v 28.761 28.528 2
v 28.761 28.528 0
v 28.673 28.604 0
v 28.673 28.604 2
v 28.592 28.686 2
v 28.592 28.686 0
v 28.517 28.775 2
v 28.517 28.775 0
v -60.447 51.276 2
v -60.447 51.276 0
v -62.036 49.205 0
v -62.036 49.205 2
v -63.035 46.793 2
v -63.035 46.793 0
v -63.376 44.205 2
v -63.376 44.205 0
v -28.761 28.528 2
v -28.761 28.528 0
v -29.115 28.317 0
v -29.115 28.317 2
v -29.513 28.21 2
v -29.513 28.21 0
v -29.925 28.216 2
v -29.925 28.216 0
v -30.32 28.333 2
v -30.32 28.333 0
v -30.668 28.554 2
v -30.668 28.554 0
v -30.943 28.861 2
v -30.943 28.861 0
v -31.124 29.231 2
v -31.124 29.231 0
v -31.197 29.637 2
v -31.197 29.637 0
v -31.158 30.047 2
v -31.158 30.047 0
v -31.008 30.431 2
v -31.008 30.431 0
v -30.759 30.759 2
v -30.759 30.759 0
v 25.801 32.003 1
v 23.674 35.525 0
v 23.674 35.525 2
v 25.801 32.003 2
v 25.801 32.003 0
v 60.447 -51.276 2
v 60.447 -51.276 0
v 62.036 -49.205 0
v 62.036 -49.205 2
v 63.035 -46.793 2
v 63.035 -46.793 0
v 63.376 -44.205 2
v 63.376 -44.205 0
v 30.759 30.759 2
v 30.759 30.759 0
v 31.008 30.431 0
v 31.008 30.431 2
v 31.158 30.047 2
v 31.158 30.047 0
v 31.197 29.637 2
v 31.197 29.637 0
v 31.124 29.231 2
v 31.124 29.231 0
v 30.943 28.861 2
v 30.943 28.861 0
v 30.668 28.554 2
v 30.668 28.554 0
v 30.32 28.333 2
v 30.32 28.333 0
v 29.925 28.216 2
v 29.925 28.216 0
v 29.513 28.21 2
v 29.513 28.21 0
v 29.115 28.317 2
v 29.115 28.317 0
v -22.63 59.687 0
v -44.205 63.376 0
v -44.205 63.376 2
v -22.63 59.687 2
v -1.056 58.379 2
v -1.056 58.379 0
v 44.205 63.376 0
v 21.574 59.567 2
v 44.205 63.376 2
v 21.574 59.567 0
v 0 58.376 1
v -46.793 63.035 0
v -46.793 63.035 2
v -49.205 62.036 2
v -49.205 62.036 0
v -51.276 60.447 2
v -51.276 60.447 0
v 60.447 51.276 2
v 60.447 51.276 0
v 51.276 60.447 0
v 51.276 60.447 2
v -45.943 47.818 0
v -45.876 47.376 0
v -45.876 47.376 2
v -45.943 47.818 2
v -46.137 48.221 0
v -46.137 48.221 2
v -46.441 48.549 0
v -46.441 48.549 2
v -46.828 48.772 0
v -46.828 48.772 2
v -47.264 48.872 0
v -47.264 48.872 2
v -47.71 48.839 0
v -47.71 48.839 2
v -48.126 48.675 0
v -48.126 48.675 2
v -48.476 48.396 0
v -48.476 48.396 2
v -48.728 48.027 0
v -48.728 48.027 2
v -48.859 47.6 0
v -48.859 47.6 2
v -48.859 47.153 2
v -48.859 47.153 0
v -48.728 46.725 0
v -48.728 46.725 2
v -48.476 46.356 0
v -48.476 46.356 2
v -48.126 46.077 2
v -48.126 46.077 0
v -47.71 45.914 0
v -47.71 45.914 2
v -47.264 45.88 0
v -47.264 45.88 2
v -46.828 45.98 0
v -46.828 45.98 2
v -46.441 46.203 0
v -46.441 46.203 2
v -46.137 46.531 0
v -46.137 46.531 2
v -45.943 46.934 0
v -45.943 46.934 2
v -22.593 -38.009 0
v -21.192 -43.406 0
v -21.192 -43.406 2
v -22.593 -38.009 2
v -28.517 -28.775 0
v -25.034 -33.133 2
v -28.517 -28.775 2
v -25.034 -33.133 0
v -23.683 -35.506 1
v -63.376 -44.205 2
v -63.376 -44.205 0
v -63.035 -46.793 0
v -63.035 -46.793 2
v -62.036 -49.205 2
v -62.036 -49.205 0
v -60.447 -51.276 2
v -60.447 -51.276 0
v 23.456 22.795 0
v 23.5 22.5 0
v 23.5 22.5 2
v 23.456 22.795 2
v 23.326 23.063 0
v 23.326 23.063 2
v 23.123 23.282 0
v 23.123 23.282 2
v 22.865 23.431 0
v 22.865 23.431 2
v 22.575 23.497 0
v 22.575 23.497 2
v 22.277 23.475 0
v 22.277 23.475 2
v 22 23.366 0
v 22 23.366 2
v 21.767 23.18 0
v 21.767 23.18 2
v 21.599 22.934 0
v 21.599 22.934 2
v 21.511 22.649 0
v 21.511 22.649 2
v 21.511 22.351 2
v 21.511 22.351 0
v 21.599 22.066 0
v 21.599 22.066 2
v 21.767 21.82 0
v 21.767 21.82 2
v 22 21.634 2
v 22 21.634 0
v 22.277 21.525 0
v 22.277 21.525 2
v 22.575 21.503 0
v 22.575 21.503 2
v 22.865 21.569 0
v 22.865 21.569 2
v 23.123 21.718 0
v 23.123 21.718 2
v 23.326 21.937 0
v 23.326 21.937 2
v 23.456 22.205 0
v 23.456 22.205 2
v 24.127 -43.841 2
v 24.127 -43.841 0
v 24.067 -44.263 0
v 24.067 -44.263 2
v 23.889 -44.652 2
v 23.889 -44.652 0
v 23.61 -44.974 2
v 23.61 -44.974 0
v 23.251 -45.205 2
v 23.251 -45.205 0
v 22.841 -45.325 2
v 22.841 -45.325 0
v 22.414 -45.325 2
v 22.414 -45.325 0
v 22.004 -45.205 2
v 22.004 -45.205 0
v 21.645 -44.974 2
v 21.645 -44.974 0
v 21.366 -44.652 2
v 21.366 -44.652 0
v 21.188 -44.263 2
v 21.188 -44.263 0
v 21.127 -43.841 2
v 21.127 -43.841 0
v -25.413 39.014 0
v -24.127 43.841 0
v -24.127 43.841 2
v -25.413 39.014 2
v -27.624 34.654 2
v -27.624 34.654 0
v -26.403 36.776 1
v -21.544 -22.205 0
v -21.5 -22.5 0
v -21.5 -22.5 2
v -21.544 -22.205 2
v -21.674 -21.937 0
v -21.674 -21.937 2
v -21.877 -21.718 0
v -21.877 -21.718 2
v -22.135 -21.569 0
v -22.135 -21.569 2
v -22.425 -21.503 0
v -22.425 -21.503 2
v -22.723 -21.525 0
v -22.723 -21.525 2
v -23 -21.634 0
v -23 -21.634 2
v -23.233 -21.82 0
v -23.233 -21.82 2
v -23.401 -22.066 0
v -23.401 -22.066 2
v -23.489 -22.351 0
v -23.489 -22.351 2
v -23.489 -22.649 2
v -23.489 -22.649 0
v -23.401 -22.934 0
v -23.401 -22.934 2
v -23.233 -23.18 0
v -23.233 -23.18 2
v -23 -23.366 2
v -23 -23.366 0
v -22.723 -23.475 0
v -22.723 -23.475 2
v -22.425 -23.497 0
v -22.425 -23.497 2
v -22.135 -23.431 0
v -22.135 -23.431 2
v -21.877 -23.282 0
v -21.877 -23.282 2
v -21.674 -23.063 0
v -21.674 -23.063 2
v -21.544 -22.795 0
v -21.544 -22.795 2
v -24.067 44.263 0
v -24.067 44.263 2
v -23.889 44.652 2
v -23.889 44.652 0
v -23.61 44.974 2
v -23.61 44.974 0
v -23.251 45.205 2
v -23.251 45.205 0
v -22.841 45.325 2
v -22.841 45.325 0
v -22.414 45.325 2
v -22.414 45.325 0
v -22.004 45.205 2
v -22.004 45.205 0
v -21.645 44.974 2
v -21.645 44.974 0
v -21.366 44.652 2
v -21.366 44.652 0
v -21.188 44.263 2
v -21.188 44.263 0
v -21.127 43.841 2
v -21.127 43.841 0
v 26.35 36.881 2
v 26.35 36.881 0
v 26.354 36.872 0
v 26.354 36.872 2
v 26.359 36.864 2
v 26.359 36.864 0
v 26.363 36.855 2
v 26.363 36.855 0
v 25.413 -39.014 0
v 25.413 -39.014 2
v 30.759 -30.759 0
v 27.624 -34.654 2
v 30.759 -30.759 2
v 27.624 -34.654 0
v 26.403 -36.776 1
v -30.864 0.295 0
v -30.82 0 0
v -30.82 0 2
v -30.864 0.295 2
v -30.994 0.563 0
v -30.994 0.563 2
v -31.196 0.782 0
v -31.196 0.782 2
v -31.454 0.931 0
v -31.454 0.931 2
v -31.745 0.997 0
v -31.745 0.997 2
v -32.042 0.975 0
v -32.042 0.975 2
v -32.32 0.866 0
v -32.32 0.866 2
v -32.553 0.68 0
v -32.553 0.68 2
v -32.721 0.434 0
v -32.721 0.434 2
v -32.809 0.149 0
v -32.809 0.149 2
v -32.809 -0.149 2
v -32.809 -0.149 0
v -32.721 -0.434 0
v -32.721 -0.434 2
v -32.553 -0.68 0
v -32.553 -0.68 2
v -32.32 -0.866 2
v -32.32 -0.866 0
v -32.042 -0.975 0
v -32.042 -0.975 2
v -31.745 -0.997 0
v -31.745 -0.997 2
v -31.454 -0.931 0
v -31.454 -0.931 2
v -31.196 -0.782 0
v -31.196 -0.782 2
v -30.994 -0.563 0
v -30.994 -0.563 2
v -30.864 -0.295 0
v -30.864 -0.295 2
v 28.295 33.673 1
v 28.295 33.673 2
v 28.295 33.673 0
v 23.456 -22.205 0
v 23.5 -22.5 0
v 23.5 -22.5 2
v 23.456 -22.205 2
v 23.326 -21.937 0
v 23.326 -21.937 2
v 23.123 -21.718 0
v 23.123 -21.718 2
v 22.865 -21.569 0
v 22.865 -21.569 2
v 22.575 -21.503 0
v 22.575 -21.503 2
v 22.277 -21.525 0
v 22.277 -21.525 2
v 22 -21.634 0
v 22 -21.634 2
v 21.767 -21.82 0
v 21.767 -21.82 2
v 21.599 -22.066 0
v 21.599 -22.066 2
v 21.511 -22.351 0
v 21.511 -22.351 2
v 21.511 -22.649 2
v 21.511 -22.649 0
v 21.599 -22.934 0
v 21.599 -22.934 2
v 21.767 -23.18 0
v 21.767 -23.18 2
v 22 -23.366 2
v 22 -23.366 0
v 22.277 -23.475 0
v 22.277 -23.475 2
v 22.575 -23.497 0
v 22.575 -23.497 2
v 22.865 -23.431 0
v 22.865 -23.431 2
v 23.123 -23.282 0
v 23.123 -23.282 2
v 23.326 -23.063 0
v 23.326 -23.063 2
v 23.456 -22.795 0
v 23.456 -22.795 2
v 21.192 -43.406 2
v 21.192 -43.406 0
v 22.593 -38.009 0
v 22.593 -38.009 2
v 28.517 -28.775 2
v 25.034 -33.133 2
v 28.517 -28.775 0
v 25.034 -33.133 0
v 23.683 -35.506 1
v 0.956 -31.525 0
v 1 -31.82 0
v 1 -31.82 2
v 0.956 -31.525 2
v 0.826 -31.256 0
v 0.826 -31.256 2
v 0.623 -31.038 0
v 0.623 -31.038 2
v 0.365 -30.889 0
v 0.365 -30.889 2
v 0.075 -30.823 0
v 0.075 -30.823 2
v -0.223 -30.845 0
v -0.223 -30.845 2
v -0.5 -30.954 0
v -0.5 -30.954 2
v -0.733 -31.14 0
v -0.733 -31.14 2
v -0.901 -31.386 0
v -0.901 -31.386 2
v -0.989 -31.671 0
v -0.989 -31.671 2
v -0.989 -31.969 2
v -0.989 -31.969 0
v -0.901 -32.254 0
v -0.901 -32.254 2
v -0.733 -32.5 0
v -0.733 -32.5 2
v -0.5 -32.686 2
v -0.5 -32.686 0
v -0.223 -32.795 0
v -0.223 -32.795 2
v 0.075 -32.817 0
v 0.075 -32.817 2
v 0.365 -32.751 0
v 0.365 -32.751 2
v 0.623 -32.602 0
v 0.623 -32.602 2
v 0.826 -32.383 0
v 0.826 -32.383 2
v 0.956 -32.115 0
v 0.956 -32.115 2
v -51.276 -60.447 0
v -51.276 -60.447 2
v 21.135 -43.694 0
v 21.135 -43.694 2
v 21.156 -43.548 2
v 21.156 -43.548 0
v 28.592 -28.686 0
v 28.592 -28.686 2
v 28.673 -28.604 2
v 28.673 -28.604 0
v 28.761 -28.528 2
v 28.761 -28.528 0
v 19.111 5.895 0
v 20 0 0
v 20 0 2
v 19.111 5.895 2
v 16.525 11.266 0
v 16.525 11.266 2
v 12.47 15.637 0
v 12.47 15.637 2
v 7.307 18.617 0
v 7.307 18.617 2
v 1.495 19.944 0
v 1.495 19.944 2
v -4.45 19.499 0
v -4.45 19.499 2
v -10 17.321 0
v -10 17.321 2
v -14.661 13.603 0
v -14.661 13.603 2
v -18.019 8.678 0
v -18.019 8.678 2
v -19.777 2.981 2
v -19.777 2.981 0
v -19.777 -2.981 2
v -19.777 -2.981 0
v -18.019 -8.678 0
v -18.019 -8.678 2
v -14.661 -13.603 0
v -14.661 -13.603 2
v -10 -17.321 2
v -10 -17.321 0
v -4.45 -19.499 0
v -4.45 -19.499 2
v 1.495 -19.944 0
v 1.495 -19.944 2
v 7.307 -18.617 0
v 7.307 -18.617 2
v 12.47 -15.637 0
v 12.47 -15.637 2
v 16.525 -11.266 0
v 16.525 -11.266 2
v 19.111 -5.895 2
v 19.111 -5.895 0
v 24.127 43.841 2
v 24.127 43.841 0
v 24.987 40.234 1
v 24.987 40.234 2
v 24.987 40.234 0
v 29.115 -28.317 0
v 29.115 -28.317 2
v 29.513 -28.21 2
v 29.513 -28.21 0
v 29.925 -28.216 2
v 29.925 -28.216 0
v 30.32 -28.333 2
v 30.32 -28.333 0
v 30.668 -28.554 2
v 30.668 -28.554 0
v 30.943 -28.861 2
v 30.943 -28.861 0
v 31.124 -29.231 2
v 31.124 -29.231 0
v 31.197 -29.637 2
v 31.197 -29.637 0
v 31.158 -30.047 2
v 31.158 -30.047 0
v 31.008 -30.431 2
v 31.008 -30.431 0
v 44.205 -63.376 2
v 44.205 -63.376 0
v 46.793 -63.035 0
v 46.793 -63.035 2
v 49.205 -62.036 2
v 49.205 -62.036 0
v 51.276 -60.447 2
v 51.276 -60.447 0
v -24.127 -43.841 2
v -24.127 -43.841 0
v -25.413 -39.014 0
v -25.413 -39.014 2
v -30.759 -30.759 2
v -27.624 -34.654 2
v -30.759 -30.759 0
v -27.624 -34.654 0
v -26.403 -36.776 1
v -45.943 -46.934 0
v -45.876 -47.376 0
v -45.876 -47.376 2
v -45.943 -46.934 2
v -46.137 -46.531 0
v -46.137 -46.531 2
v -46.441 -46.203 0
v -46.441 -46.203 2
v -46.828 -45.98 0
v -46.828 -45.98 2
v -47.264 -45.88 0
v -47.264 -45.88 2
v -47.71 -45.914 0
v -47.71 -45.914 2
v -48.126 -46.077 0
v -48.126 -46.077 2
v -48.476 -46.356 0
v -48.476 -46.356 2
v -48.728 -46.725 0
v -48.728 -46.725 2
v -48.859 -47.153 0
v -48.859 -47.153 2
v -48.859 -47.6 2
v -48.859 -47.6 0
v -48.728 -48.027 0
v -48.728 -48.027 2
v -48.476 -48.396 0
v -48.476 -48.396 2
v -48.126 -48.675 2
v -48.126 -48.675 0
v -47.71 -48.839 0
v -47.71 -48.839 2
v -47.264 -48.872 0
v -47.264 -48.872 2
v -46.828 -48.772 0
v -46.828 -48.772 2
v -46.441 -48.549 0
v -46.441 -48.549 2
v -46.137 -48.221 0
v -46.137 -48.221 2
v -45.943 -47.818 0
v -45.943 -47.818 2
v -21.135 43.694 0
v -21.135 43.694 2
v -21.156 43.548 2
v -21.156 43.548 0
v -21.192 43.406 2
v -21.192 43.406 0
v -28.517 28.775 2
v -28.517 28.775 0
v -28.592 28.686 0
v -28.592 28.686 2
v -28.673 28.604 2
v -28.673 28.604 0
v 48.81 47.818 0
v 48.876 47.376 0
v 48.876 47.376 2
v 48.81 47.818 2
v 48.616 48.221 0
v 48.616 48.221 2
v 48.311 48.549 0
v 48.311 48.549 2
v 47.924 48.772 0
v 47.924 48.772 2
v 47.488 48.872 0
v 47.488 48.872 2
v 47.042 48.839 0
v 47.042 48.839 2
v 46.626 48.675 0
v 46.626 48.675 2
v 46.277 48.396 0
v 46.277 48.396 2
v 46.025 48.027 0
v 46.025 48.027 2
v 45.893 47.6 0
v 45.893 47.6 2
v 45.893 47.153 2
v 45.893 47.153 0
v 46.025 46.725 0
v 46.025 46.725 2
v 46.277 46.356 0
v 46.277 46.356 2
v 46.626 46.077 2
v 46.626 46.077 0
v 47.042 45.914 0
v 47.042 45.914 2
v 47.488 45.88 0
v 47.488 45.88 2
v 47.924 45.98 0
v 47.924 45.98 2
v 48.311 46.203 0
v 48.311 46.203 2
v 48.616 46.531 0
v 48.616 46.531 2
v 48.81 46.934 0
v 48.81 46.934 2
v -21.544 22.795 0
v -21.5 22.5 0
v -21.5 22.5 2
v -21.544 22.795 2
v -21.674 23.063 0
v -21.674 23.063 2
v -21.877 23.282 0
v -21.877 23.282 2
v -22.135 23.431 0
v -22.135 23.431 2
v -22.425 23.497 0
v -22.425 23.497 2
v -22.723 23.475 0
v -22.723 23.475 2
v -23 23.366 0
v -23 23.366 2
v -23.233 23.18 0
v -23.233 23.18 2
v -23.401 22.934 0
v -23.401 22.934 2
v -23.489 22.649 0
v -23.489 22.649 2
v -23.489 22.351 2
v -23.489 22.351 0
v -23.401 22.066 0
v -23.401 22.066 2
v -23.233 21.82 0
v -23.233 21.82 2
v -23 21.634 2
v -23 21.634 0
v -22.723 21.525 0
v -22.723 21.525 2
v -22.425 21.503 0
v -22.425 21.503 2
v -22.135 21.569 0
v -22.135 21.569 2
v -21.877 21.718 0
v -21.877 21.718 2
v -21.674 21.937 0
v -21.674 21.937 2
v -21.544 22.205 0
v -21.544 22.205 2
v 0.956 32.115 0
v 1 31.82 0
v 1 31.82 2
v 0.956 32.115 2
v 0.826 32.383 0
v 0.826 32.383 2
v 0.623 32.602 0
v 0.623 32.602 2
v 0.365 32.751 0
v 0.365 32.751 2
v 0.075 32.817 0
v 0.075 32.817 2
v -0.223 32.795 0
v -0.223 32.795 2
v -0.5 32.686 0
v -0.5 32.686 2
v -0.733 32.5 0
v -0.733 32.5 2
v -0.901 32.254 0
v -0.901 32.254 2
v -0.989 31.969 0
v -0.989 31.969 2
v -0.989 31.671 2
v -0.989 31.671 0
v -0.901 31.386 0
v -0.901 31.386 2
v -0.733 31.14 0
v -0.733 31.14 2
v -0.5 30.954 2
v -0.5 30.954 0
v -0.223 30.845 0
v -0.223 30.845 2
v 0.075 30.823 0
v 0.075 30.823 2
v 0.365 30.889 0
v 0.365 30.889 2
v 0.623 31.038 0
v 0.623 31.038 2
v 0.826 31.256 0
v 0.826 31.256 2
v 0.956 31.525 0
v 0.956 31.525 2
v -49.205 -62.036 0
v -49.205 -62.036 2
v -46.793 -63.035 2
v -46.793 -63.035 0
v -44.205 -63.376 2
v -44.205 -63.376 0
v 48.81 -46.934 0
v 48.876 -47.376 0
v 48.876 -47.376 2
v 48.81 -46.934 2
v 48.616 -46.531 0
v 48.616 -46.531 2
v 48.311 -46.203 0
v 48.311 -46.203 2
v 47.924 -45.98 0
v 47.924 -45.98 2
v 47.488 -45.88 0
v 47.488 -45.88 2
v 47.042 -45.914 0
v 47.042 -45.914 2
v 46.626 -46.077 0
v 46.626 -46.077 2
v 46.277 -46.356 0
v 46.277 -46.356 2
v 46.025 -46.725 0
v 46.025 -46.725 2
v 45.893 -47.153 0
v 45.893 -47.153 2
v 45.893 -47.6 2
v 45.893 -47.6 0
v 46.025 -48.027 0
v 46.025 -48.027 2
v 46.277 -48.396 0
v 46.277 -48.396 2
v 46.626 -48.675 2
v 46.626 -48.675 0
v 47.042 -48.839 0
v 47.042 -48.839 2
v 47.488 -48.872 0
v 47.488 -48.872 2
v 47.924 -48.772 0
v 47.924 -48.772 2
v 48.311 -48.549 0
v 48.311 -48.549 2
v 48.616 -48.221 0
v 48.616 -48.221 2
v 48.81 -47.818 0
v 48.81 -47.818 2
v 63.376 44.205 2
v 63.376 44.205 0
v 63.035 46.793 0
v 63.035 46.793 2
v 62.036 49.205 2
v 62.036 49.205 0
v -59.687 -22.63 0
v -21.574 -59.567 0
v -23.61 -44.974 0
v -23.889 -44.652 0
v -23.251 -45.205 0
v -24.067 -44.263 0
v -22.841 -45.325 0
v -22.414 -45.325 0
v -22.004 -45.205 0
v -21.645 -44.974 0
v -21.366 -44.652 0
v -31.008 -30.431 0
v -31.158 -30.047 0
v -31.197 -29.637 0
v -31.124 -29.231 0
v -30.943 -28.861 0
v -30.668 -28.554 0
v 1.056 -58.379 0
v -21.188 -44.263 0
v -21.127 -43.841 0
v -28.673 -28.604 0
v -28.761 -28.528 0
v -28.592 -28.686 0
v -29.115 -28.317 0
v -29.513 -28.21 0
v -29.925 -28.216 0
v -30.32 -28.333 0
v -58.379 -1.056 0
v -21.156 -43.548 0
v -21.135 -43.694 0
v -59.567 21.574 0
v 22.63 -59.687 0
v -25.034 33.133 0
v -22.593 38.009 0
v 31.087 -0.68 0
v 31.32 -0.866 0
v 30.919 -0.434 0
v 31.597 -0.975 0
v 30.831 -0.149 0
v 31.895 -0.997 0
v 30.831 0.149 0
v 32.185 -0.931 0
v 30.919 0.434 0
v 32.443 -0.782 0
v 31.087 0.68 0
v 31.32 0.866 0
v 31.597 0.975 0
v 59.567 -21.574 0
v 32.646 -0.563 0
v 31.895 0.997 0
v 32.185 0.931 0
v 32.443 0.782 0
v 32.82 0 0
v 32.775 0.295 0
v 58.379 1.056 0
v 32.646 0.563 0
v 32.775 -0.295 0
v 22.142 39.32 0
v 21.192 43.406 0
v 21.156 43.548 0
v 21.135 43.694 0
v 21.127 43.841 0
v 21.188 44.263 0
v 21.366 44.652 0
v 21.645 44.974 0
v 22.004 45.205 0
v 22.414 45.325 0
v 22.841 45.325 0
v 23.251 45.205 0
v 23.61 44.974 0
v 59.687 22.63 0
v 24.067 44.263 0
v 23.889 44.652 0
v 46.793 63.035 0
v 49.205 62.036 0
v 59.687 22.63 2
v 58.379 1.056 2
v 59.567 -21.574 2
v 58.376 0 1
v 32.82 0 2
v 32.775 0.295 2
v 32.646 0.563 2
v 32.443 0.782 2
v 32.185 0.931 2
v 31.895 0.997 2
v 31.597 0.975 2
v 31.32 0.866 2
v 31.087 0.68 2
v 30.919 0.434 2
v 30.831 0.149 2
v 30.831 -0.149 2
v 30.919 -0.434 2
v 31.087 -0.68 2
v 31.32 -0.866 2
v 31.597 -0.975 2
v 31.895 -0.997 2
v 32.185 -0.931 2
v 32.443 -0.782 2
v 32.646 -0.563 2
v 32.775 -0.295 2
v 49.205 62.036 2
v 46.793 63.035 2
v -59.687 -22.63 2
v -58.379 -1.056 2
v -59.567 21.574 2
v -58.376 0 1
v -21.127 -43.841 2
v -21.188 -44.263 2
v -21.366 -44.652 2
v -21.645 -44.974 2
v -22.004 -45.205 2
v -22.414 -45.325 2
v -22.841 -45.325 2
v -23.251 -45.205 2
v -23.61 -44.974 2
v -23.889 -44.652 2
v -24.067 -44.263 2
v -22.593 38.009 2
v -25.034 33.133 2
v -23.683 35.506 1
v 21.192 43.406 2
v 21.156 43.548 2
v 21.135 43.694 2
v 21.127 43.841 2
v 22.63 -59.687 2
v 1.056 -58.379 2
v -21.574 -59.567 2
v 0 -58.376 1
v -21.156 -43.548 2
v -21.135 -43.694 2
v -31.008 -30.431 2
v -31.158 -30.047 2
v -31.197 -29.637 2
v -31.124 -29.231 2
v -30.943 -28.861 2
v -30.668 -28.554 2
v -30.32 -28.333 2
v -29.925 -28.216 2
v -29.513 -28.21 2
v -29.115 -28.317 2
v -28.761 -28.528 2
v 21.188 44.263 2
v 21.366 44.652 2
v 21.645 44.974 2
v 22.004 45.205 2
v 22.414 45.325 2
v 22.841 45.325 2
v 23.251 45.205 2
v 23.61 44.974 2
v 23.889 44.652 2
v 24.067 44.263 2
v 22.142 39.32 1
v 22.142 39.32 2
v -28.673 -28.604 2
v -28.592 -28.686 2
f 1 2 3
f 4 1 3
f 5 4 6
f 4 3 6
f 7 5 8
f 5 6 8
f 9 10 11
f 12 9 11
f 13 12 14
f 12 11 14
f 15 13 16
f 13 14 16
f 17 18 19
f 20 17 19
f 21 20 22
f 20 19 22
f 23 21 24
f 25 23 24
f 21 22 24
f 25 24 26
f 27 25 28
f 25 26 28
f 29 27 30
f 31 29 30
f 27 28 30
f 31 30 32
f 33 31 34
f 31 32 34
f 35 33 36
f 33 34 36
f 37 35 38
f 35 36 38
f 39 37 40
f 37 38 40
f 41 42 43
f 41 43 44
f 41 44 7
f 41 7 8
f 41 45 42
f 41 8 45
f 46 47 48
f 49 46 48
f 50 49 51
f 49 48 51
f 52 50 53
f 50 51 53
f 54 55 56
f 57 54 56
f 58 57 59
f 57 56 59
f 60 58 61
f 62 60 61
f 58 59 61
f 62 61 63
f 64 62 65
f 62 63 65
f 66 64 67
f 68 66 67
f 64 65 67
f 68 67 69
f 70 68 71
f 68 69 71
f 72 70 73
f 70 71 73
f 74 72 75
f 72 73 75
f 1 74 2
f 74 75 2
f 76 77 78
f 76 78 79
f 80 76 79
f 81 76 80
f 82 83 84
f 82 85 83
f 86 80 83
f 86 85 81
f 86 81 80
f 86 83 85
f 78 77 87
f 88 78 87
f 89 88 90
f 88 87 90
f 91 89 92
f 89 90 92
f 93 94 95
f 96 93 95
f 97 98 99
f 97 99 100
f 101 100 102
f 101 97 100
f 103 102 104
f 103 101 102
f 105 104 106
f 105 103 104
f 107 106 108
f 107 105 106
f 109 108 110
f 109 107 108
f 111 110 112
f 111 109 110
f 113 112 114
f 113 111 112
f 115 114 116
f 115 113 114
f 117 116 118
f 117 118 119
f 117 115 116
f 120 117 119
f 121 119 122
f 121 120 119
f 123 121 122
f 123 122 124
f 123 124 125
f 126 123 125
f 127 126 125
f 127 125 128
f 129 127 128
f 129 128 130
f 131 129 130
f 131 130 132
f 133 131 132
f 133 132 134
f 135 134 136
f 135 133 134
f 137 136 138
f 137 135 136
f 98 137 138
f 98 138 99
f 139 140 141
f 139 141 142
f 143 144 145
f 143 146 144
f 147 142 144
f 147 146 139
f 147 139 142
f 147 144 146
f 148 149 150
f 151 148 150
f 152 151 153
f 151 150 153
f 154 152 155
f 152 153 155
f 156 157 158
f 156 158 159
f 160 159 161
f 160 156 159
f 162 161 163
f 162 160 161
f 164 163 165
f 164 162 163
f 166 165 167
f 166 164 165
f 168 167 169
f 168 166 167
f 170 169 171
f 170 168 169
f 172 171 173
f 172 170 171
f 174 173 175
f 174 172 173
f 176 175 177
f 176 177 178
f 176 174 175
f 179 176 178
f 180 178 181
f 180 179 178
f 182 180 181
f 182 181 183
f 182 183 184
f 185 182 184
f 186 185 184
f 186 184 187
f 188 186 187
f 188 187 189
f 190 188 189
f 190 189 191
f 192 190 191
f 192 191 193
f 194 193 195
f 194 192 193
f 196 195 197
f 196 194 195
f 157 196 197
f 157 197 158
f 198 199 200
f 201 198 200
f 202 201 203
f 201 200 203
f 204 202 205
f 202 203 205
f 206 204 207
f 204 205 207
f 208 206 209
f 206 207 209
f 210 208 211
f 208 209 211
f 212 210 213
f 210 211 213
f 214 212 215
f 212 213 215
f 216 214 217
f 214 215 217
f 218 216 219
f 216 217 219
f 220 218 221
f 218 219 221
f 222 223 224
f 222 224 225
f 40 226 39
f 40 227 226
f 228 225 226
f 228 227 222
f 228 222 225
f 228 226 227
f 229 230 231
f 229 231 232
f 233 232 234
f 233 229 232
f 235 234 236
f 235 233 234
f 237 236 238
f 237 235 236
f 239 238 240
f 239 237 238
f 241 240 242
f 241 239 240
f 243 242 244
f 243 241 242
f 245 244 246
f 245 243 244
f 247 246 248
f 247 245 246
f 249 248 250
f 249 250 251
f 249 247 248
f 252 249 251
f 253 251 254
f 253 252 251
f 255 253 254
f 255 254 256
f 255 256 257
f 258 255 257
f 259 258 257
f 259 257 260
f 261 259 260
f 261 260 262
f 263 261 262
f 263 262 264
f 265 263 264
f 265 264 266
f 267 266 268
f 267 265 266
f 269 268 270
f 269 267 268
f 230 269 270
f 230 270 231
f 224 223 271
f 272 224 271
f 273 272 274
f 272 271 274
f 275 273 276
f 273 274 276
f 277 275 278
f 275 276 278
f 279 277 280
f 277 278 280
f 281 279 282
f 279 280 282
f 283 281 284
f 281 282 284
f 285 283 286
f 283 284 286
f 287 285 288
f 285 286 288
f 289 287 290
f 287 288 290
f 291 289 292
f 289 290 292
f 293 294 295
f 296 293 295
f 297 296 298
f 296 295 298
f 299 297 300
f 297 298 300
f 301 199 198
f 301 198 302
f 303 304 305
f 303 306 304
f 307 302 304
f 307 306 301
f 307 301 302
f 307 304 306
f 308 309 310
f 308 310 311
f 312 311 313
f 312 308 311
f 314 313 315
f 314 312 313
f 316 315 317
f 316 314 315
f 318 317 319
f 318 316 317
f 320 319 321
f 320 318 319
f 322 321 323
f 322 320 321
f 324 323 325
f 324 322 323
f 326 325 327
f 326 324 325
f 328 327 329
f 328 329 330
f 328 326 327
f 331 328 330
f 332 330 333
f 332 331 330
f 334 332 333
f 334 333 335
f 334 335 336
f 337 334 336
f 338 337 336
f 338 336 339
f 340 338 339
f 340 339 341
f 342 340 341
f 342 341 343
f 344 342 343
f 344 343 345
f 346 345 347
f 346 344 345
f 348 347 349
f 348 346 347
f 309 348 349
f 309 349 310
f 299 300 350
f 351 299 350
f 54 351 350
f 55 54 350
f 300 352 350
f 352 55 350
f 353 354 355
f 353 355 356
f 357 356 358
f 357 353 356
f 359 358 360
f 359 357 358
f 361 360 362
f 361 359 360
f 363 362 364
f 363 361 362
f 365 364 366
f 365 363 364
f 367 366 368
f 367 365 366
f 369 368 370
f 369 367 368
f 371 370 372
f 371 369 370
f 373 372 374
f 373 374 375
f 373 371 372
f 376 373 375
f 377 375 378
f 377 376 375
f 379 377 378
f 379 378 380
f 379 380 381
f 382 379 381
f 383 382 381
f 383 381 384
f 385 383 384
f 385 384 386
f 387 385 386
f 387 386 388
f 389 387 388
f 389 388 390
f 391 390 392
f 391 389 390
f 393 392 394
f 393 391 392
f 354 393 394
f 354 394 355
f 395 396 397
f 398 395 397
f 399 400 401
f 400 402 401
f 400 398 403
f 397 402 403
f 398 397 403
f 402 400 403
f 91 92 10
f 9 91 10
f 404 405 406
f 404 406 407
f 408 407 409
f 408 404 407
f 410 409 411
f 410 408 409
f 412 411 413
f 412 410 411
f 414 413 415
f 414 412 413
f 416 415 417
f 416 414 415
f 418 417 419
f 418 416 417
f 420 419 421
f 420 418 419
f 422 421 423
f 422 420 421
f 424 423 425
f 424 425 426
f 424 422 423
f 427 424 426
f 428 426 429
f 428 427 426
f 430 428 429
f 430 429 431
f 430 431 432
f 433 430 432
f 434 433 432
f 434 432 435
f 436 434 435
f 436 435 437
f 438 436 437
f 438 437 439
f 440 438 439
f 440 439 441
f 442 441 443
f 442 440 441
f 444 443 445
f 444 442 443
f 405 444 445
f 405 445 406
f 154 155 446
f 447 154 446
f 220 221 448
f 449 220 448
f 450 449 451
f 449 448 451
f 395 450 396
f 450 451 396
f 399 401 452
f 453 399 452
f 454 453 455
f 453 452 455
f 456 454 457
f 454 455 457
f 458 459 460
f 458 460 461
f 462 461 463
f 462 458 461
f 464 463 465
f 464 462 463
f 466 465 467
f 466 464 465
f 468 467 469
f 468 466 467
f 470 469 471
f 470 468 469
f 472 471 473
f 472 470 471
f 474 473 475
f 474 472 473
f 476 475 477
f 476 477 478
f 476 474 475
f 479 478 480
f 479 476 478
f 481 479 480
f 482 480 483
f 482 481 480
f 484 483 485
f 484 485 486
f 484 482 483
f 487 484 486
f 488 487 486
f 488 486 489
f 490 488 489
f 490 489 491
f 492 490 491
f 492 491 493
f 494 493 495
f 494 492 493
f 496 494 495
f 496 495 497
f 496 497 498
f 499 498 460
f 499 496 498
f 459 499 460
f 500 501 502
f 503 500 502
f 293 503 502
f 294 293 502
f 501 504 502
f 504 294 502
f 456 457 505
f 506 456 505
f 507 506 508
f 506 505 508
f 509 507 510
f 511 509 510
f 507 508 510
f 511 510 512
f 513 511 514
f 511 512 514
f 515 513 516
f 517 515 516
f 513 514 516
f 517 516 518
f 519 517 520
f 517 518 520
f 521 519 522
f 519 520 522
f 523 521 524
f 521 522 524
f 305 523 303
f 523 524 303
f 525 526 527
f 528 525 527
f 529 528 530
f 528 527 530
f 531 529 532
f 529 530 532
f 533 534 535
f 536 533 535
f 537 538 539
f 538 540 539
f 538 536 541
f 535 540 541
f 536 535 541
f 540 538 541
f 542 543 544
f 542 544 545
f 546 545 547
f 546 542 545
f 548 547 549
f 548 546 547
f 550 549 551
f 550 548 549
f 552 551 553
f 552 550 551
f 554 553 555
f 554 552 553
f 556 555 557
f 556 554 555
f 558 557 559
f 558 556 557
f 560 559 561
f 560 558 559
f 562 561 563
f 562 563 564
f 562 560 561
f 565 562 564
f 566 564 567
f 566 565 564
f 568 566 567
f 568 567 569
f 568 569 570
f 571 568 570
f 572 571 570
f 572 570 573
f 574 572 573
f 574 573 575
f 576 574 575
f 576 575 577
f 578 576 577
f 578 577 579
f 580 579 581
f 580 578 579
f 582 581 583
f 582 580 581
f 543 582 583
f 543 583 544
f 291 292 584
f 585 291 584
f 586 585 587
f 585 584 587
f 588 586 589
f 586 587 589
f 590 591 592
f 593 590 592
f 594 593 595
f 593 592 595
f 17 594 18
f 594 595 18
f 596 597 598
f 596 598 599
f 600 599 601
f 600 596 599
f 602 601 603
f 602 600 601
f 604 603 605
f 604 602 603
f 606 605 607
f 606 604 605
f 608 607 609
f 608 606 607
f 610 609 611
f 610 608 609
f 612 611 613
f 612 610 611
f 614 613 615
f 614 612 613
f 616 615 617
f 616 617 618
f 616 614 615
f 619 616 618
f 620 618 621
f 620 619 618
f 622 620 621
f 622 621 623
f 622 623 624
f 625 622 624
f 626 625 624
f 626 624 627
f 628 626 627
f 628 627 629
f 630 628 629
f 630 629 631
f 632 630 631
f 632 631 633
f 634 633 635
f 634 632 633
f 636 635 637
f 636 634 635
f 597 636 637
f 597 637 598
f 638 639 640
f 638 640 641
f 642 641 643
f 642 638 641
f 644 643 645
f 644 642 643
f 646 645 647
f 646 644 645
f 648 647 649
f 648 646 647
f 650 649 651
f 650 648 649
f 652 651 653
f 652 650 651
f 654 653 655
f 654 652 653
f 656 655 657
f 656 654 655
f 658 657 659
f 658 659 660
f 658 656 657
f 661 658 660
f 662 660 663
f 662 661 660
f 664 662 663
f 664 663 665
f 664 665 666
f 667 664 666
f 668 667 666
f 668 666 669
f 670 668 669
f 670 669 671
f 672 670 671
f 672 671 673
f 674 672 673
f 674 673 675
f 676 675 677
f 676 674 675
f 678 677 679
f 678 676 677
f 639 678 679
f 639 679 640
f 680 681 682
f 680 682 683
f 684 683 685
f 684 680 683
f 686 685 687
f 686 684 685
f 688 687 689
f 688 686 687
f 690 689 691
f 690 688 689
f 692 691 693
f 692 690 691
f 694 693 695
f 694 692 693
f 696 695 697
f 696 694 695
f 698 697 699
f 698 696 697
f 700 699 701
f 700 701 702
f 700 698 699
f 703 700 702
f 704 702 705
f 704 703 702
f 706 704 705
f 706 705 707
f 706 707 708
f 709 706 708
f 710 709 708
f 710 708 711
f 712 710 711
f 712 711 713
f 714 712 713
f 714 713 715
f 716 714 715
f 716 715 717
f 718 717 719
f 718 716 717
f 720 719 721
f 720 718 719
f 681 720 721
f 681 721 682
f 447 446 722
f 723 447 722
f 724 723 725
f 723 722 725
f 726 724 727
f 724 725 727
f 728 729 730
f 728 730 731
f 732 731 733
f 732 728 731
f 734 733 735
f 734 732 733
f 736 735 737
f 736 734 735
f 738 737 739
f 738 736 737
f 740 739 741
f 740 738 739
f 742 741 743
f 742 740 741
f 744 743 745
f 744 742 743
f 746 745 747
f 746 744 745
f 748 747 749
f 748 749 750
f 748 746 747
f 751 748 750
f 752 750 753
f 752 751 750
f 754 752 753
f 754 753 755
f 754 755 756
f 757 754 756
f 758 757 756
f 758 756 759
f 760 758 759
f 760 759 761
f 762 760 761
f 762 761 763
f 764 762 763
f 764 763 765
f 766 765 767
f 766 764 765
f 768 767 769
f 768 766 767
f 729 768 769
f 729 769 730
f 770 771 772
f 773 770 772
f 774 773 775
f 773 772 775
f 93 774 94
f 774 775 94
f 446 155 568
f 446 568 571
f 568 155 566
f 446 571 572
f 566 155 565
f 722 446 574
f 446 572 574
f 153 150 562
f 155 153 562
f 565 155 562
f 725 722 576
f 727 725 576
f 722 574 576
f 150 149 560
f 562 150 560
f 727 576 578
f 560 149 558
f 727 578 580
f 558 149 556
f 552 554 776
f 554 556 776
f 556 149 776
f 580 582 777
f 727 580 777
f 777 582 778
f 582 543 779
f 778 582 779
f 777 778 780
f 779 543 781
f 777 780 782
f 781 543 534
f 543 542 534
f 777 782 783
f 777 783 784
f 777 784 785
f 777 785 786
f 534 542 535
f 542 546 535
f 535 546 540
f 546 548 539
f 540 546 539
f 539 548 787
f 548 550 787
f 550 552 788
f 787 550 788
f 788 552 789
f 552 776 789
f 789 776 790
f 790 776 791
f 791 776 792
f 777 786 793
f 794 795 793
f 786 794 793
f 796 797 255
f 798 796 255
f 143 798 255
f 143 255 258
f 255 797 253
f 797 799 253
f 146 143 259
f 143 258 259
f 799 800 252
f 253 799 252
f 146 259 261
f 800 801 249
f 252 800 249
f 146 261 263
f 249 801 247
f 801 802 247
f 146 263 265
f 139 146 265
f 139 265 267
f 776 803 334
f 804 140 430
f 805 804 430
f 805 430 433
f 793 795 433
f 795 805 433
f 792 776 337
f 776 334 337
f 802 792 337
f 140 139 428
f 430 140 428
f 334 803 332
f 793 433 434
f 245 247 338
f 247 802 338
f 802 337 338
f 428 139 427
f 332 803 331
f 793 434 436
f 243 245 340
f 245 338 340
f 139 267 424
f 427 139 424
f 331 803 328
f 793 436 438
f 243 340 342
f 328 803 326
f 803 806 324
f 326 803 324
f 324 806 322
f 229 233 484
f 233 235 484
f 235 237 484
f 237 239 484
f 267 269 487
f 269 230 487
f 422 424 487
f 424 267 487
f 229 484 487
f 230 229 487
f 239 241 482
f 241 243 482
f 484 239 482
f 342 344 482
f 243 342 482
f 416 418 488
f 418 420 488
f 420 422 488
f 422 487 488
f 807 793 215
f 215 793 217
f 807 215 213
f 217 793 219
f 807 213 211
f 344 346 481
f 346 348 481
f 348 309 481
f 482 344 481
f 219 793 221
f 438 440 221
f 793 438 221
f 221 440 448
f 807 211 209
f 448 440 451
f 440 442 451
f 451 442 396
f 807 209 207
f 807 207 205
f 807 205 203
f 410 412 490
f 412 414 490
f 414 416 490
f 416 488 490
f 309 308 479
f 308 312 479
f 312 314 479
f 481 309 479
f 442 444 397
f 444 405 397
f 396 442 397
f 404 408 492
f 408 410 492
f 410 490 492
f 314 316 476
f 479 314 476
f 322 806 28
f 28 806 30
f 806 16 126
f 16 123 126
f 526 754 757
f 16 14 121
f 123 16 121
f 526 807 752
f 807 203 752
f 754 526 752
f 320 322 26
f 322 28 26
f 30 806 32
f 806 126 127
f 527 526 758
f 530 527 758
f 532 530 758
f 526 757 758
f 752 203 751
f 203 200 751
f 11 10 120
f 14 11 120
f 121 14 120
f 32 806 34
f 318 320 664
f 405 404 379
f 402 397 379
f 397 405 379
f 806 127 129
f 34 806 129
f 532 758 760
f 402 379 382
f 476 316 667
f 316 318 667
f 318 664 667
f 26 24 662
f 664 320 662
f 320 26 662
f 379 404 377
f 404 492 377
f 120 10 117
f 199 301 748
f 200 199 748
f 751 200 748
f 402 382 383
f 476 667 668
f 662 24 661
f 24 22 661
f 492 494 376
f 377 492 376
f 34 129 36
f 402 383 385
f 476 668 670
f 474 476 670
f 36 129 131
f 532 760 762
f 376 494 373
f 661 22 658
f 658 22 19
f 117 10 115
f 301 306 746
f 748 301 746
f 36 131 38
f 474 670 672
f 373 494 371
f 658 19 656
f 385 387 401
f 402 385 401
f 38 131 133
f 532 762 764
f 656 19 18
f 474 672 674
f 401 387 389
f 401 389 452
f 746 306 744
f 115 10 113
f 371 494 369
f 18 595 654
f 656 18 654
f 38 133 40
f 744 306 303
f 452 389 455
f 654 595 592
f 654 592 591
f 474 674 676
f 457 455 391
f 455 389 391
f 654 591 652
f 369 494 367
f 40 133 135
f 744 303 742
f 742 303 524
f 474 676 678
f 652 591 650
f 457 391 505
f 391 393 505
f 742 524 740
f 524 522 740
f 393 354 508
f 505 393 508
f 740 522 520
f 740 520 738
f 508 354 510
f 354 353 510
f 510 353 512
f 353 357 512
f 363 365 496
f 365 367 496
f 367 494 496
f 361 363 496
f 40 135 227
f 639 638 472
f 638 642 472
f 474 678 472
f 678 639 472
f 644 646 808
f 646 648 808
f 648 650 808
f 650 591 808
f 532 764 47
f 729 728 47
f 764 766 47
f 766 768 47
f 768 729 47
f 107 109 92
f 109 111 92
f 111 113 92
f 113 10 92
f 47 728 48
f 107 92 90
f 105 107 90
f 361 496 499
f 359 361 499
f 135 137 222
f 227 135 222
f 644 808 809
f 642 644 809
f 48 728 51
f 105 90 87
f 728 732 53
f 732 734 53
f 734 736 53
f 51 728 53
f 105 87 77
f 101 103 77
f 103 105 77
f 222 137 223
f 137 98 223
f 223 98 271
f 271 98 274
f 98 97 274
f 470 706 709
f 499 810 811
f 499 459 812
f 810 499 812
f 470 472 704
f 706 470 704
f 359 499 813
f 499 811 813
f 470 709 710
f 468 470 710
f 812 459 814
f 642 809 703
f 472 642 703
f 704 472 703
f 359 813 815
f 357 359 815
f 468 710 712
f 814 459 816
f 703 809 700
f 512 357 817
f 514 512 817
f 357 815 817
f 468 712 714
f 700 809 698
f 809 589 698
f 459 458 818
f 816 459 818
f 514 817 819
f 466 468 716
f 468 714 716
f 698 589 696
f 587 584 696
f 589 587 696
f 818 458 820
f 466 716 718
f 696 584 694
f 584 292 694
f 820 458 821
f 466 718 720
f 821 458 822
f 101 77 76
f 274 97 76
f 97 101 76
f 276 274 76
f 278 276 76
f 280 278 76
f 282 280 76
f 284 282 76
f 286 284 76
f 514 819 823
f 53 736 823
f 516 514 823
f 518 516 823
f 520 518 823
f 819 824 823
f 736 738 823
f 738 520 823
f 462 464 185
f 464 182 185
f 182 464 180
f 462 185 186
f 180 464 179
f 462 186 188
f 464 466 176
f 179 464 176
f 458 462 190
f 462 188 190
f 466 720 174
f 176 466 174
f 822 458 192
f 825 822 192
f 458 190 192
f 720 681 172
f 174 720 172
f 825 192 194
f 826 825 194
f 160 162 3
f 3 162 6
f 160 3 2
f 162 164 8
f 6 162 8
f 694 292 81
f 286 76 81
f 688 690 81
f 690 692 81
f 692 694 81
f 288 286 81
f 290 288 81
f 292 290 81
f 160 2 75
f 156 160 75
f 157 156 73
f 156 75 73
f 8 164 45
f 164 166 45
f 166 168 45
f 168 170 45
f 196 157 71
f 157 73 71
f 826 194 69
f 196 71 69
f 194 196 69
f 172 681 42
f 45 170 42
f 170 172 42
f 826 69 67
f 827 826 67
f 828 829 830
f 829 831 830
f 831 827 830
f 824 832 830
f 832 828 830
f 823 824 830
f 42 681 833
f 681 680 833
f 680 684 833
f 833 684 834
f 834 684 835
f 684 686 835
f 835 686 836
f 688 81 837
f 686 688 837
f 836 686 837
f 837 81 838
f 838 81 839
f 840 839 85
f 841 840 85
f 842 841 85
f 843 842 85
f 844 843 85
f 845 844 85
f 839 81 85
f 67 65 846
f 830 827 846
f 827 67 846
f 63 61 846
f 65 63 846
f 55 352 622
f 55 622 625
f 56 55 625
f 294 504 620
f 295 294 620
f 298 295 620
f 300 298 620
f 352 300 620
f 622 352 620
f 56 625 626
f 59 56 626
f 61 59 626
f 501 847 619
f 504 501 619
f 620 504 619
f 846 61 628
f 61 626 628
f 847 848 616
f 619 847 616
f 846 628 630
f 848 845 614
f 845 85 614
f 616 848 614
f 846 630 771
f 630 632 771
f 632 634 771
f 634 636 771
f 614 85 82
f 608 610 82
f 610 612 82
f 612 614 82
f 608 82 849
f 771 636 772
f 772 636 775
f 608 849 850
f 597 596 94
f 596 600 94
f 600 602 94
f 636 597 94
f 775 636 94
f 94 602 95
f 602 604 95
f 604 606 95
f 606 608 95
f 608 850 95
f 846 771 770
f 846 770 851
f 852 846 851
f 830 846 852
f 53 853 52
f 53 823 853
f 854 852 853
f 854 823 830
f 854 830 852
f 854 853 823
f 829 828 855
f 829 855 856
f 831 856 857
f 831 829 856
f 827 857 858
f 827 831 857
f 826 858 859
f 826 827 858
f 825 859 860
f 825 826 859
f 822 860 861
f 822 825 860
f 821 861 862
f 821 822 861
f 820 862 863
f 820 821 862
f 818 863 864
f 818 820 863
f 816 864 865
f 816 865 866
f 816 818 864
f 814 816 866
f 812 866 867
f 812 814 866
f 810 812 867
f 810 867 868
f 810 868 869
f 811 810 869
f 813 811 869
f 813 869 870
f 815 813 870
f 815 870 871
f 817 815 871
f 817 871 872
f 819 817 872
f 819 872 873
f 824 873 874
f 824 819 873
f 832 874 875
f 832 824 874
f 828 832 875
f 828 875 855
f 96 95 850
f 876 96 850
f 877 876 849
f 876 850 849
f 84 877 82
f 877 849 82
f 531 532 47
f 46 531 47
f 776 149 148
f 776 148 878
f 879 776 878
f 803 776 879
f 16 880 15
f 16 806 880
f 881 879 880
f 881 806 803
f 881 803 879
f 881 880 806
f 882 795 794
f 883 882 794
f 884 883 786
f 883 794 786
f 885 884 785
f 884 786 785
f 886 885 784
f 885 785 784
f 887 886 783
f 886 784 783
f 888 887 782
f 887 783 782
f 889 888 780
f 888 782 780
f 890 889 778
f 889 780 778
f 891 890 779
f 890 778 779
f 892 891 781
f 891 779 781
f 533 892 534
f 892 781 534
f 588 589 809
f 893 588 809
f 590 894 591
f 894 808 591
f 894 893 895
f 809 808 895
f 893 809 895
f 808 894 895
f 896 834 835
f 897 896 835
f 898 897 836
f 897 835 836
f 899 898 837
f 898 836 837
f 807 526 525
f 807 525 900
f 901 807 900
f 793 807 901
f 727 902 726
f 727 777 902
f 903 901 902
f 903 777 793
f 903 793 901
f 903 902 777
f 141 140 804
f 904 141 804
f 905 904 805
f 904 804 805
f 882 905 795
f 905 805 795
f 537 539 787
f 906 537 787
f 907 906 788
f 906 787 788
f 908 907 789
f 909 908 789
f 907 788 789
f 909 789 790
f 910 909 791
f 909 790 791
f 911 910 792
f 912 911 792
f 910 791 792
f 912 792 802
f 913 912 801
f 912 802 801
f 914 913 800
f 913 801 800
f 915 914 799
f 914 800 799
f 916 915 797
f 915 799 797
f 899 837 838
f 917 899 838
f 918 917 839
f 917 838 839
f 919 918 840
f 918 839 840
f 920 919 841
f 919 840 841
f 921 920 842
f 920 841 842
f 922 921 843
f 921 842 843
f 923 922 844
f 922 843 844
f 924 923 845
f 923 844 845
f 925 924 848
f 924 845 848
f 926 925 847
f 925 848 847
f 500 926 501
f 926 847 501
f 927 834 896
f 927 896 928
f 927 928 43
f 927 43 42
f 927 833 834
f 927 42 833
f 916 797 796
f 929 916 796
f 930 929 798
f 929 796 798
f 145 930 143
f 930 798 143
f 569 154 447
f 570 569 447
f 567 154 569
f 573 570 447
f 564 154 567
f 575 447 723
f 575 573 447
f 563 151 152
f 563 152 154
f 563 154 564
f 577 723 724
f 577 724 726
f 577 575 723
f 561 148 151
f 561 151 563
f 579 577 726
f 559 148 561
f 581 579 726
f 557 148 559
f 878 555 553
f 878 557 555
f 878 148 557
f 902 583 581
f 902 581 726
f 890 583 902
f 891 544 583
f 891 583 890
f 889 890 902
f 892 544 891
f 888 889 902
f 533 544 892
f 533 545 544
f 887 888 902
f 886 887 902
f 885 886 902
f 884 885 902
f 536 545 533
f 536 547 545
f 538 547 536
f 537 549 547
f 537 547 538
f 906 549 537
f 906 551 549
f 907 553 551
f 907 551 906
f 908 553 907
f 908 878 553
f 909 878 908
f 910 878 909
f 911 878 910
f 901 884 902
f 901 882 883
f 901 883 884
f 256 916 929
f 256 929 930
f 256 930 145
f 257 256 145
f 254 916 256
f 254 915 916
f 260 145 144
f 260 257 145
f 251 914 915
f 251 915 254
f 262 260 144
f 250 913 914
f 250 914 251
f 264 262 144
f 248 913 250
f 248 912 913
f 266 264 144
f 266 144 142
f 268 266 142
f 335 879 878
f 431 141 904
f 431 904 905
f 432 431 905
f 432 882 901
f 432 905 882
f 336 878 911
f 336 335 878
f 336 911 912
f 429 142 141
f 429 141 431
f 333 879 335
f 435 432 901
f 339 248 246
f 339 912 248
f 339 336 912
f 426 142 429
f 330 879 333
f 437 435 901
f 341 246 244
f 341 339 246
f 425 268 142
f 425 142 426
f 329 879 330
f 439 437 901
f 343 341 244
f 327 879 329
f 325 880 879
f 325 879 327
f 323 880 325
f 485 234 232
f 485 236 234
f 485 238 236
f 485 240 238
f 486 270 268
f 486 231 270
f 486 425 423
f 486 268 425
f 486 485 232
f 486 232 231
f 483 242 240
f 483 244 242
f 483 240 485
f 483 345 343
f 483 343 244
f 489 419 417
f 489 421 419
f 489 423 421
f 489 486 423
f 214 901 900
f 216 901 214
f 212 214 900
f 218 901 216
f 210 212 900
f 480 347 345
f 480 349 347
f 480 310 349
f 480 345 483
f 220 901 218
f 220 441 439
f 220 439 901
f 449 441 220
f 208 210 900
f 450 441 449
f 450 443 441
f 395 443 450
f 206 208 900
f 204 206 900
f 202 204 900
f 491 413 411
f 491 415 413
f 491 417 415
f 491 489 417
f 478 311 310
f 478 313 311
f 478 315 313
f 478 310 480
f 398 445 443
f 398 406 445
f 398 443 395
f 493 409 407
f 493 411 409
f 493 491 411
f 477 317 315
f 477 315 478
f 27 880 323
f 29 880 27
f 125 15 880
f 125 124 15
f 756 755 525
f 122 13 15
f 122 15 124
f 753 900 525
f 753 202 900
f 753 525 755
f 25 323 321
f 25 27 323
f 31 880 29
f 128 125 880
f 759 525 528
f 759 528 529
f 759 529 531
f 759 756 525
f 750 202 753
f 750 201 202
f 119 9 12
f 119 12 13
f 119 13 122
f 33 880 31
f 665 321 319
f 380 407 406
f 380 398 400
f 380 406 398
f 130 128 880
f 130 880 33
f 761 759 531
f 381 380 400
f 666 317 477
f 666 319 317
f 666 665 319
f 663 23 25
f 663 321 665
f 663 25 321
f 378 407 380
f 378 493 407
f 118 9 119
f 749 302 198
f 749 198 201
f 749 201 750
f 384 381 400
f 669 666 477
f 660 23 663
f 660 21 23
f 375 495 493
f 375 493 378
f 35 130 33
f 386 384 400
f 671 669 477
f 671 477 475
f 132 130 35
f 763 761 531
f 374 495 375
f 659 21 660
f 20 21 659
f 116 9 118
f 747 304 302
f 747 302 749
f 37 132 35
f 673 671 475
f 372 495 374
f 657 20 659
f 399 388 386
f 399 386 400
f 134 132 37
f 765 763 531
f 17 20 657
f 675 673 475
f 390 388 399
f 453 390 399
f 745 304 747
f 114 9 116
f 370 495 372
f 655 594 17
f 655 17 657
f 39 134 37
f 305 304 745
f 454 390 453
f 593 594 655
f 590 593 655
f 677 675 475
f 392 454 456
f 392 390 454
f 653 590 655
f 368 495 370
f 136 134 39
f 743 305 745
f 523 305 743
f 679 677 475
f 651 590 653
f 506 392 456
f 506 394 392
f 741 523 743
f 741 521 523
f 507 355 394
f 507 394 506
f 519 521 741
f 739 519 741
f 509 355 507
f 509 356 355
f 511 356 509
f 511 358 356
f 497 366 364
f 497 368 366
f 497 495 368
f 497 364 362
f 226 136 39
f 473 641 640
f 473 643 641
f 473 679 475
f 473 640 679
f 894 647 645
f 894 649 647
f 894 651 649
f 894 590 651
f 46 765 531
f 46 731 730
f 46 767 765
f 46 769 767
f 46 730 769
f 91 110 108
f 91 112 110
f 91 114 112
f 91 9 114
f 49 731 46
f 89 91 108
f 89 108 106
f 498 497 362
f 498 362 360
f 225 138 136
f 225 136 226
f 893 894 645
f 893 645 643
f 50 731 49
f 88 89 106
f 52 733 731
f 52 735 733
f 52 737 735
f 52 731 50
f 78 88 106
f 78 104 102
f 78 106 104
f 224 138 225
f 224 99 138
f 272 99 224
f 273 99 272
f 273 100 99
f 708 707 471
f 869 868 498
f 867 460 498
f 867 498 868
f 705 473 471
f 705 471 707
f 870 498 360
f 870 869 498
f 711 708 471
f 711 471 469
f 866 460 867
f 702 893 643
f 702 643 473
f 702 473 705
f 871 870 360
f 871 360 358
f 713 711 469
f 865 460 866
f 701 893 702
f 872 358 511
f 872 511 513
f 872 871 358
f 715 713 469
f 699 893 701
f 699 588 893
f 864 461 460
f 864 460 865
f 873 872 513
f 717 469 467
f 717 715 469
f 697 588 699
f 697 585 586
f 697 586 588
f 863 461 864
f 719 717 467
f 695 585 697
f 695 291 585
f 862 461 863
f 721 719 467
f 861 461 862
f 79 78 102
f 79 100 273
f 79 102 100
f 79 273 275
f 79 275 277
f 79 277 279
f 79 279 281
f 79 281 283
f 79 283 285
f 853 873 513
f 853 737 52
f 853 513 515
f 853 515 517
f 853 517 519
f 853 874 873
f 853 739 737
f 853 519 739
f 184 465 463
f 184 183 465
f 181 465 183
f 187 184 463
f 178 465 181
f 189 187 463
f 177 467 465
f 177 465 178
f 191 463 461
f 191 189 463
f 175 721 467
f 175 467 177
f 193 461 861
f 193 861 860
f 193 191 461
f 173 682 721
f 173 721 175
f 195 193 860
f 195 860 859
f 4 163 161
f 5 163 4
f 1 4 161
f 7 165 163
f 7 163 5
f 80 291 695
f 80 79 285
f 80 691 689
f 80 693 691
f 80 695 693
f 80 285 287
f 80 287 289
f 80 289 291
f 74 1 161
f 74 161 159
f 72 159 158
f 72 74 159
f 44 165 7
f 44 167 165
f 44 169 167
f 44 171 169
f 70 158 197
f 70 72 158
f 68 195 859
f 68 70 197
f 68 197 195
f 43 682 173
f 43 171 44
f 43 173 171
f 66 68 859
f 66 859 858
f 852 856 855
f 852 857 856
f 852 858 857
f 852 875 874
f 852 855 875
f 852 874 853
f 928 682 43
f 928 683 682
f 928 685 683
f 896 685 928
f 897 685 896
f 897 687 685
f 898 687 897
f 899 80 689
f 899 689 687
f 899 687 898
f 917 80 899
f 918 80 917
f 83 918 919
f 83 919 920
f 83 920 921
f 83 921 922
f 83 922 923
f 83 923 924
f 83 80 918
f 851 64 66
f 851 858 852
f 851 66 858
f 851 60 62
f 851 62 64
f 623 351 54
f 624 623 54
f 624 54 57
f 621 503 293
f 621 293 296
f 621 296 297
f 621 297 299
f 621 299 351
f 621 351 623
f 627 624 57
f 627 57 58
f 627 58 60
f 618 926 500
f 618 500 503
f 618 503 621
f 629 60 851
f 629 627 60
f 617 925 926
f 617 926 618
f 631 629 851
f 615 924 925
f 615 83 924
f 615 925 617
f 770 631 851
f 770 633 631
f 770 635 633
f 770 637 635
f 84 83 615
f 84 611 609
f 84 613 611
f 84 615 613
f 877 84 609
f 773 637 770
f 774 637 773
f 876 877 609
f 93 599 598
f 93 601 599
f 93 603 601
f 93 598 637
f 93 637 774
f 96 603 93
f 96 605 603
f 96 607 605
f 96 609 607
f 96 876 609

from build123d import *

# Parameters (mm, degrees)
SKETCH1_R           = 1.5
SKETCH1_R_2         = 1
SKETCH1_R_3         = 20
BOSS_EXTRUDE1_DEPTH = 2


with BuildPart() as part:
    # Sketch1 → Boss-Extrude1 (new body)
    with BuildSketch(Plane.XY):
        with BuildLine():
            Line((60.447222151, 51.275649276), (51.275649276, 60.447222151))
            ThreePointArc((51.275649276, 60.447222151), (48.031415788, 62.614949665), (44.204581464, 63.376154339))
            add(Edge.make_bspline(
                [(-44.204581464, 63.376154339), (0, 53.376154339), (44.204581464, 63.376154339)],
                knots=[0, 0, 0, 1, 1, 1], degree=2))
            ThreePointArc((-44.204581464, 63.376154339), (-48.031415788, 62.614949665), (-51.275649276, 60.447222151))
            Line((-51.275649276, 60.447222151), (-60.447222151, 51.275649276))
            ThreePointArc((-60.447222151, 51.275649276), (-62.614949665, 48.031415788), (-63.376154339, 44.204581464))
            add(Edge.make_bspline(
                [(-63.376154339, -44.204581464), (-53.376154339, 0), (-63.376154339, 44.204581464)],
                knots=[0, 0, 0, 1, 1, 1], degree=2))
            ThreePointArc((-63.376154339, -44.204581464), (-62.614949665, -48.031415788), (-60.447222151, -51.275649276))
            Line((-60.447222151, -51.275649276), (-51.275649276, -60.447222151))
            ThreePointArc((-51.275649276, -60.447222151), (-48.031415788, -62.614949665), (-44.204581464, -63.376154339))
            add(Edge.make_bspline(
                [(44.204581464, -63.376154339), (0, -53.376154339), (-44.204581464, -63.376154339)],
                knots=[0, 0, 0, 1, 1, 1], degree=2))
            ThreePointArc((44.204581464, -63.376154339), (48.031415788, -62.614949665), (51.275649276, -60.447222151))
            Line((51.275649276, -60.447222151), (60.447222151, -51.275649276))
            ThreePointArc((60.447222151, -51.275649276), (62.614949665, -48.031415788), (63.376154339, -44.204581464))
            add(Edge.make_bspline(
                [(63.376154339, 44.204581464), (53.376154339, 0), (63.376154339, -44.204581464)],
                knots=[0, 0, 0, 1, 1, 1], degree=2))
            ThreePointArc((63.376154339, 44.204581464), (62.614949665, 48.031415788), (60.447222151, 51.275649276))
        make_face()
        with Locations((-47.376154339, -47.376154339)):
            Circle(SKETCH1_R, mode=Mode.SUBTRACT)
        with BuildLine():
            ThreePointArc((-28.761031711, -28.527510136), (-28.631586297, -28.644099888), (-28.51653182, -28.774911786))
            add(Edge.make_bspline(
                [(-21.191797917, -43.405881611), (-22.512426592, -34.921752495), (-28.516531822, -28.774911788)],
                knots=[0.024414386, 0.024414386, 0.024414386, 0.9806816, 0.9806816, 0.9806816], degree=2))
            ThreePointArc((-21.191797914, -43.40588161), (-21.143599518, -43.62088039), (-21.127416998, -43.840620434))
            ThreePointArc((-21.127416998, -43.840620434), (-22.627416998, -45.340620434), (-24.127416998, -43.840620434))
            add(Edge.make_bspline(
                [(-24.127416998, -43.840620434), (-25.362407372, -36.251653189), (-30.759144982, -30.759144982)],
                knots=[0, 0, 0, 1, 1, 1], degree=2))
            ThreePointArc((-30.759144982, -30.759144982), (-30.816001484, -28.697906735), (-28.761031711, -28.527510136))
        make_face(mode=Mode.SUBTRACT)
        with Locations((-31.8198, 0)):
            Circle(SKETCH1_R_2, mode=Mode.SUBTRACT)
        with Locations((-22.499996356, -22.499996356)):
            Circle(SKETCH1_R_2, mode=Mode.SUBTRACT)
        with Locations((0, -31.8198)):
            Circle(SKETCH1_R_2, mode=Mode.SUBTRACT)
        with BuildLine():
            add(Edge.make_bspline(
                [(24.127416998, -43.840620434), (25.362407372, -36.251653189), (30.759144982, -30.759144982)],
                knots=[0, 0, 0, 1, 1, 1], degree=2))
            ThreePointArc((24.127416998, -43.840620434), (22.627416998, -45.340620434), (21.127416998, -43.840620434))
            ThreePointArc((21.127416998, -43.840620434), (21.143599518, -43.62088039), (21.191797914, -43.40588161))
            add(Edge.make_bspline(
                [(21.191797917, -43.405881611), (22.512426592, -34.921752495), (28.516531822, -28.774911788)],
                knots=[0.024414386, 0.024414386, 0.024414386, 0.9806816, 0.9806816, 0.9806816], degree=2))
            ThreePointArc((28.51653182, -28.774911786), (28.631586297, -28.644099888), (28.761031711, -28.527510136))
            ThreePointArc((28.761031711, -28.527510136), (30.816001484, -28.697906735), (30.759144982, -30.759144982))
        make_face(mode=Mode.SUBTRACT)
        with Locations((47.376154339, -47.376154339)):
            Circle(SKETCH1_R, mode=Mode.SUBTRACT)
        with Locations((22.499996356, -22.499996356)):
            Circle(SKETCH1_R_2, mode=Mode.SUBTRACT)
        Circle(SKETCH1_R_3, mode=Mode.SUBTRACT)
        with Locations((31.8198, 0)):
            Circle(SKETCH1_R_2, mode=Mode.SUBTRACT)
        with Locations((-22.499996356, 22.499996356)):
            Circle(SKETCH1_R_2, mode=Mode.SUBTRACT)
        with Locations((-47.376154339, 47.376154339)):
            Circle(SKETCH1_R, mode=Mode.SUBTRACT)
        with BuildLine():
            add(Edge.make_bspline(
                [(-24.127416998, 43.840620434), (-25.362407372, 36.251653189), (-30.759144982, 30.759144982)],
                knots=[0, 0, 0, 1, 1, 1], degree=2))
            ThreePointArc((-24.127416998, 43.840620434), (-22.627416998, 45.340620434), (-21.127416998, 43.840620434))
            ThreePointArc((-21.127416998, 43.840620434), (-21.143599518, 43.62088039), (-21.191797914, 43.40588161))
            add(Edge.make_bspline(
                [(-21.191797917, 43.405881611), (-22.512426592, 34.921752495), (-28.516531822, 28.774911788)],
                knots=[0.024414386, 0.024414386, 0.024414386, 0.9806816, 0.9806816, 0.9806816], degree=2))
            ThreePointArc((-28.51653182, 28.774911786), (-28.631586297, 28.644099888), (-28.761031711, 28.527510136))
            ThreePointArc((-28.761031711, 28.527510136), (-30.816001484, 28.697906735), (-30.759144982, 30.759144982))
        make_face(mode=Mode.SUBTRACT)
        with Locations((22.499996356, 22.499996356)):
            Circle(SKETCH1_R_2, mode=Mode.SUBTRACT)
        with Locations((0, 31.8198)):
            Circle(SKETCH1_R_2, mode=Mode.SUBTRACT)
        with BuildLine():
            ThreePointArc((28.761031711, 28.527510136), (28.631586297, 28.644099888), (28.51653182, 28.774911786))
            add(Edge.make_bspline(
                [(23.673604803, 35.525452482), (25.506528794, 31.856471559), (28.516531822, 28.774911788)],
                knots=[0.501281739, 0.501281739, 0.501281739, 0.9806816, 0.9806816, 0.9806816], degree=2))
            add(Edge.make_bspline(
                [(21.191797917, 43.405881611), (21.850363527, 39.175051421), (23.673604803, 35.525452482)],
                knots=[0.024414386, 0.024414386, 0.024414386, 0.501281739, 0.501281739, 0.501281739], degree=2))
            ThreePointArc((21.191797914, 43.40588161), (21.143599518, 43.62088039), (21.127416998, 43.840620434))
            ThreePointArc((21.127416998, 43.840620434), (22.627416998, 45.340620434), (24.127416998, 43.840620434))
            add(Edge.make_bspline(
                [(24.127416998, 43.840620434), (24.734971072, 40.107224563), (26.349731434, 36.881203745)],
                knots=[0, 0, 0, 0.491950453, 0.491950453, 0.491950453], degree=2))
            ThreePointArc((26.349731434, 36.881203745), (26.356395509, 36.86807251), (26.362930356, 36.854876488))
            add(Edge.make_bspline(
                [(26.362930356, 36.854876488), (28.028171669, 33.538582193), (30.759144982, 30.759144982)],
                knots=[0.493958478, 0.493958478, 0.493958478, 1, 1, 1], degree=2))
            ThreePointArc((30.759144982, 30.759144982), (30.816001484, 28.697906735), (28.761031711, 28.527510136))
        make_face(mode=Mode.SUBTRACT)
        with Locations((47.376154339, 47.376154339)):
            Circle(SKETCH1_R, mode=Mode.SUBTRACT)
    extrude(amount=BOSS_EXTRUDE1_DEPTH)


solid = part.part
